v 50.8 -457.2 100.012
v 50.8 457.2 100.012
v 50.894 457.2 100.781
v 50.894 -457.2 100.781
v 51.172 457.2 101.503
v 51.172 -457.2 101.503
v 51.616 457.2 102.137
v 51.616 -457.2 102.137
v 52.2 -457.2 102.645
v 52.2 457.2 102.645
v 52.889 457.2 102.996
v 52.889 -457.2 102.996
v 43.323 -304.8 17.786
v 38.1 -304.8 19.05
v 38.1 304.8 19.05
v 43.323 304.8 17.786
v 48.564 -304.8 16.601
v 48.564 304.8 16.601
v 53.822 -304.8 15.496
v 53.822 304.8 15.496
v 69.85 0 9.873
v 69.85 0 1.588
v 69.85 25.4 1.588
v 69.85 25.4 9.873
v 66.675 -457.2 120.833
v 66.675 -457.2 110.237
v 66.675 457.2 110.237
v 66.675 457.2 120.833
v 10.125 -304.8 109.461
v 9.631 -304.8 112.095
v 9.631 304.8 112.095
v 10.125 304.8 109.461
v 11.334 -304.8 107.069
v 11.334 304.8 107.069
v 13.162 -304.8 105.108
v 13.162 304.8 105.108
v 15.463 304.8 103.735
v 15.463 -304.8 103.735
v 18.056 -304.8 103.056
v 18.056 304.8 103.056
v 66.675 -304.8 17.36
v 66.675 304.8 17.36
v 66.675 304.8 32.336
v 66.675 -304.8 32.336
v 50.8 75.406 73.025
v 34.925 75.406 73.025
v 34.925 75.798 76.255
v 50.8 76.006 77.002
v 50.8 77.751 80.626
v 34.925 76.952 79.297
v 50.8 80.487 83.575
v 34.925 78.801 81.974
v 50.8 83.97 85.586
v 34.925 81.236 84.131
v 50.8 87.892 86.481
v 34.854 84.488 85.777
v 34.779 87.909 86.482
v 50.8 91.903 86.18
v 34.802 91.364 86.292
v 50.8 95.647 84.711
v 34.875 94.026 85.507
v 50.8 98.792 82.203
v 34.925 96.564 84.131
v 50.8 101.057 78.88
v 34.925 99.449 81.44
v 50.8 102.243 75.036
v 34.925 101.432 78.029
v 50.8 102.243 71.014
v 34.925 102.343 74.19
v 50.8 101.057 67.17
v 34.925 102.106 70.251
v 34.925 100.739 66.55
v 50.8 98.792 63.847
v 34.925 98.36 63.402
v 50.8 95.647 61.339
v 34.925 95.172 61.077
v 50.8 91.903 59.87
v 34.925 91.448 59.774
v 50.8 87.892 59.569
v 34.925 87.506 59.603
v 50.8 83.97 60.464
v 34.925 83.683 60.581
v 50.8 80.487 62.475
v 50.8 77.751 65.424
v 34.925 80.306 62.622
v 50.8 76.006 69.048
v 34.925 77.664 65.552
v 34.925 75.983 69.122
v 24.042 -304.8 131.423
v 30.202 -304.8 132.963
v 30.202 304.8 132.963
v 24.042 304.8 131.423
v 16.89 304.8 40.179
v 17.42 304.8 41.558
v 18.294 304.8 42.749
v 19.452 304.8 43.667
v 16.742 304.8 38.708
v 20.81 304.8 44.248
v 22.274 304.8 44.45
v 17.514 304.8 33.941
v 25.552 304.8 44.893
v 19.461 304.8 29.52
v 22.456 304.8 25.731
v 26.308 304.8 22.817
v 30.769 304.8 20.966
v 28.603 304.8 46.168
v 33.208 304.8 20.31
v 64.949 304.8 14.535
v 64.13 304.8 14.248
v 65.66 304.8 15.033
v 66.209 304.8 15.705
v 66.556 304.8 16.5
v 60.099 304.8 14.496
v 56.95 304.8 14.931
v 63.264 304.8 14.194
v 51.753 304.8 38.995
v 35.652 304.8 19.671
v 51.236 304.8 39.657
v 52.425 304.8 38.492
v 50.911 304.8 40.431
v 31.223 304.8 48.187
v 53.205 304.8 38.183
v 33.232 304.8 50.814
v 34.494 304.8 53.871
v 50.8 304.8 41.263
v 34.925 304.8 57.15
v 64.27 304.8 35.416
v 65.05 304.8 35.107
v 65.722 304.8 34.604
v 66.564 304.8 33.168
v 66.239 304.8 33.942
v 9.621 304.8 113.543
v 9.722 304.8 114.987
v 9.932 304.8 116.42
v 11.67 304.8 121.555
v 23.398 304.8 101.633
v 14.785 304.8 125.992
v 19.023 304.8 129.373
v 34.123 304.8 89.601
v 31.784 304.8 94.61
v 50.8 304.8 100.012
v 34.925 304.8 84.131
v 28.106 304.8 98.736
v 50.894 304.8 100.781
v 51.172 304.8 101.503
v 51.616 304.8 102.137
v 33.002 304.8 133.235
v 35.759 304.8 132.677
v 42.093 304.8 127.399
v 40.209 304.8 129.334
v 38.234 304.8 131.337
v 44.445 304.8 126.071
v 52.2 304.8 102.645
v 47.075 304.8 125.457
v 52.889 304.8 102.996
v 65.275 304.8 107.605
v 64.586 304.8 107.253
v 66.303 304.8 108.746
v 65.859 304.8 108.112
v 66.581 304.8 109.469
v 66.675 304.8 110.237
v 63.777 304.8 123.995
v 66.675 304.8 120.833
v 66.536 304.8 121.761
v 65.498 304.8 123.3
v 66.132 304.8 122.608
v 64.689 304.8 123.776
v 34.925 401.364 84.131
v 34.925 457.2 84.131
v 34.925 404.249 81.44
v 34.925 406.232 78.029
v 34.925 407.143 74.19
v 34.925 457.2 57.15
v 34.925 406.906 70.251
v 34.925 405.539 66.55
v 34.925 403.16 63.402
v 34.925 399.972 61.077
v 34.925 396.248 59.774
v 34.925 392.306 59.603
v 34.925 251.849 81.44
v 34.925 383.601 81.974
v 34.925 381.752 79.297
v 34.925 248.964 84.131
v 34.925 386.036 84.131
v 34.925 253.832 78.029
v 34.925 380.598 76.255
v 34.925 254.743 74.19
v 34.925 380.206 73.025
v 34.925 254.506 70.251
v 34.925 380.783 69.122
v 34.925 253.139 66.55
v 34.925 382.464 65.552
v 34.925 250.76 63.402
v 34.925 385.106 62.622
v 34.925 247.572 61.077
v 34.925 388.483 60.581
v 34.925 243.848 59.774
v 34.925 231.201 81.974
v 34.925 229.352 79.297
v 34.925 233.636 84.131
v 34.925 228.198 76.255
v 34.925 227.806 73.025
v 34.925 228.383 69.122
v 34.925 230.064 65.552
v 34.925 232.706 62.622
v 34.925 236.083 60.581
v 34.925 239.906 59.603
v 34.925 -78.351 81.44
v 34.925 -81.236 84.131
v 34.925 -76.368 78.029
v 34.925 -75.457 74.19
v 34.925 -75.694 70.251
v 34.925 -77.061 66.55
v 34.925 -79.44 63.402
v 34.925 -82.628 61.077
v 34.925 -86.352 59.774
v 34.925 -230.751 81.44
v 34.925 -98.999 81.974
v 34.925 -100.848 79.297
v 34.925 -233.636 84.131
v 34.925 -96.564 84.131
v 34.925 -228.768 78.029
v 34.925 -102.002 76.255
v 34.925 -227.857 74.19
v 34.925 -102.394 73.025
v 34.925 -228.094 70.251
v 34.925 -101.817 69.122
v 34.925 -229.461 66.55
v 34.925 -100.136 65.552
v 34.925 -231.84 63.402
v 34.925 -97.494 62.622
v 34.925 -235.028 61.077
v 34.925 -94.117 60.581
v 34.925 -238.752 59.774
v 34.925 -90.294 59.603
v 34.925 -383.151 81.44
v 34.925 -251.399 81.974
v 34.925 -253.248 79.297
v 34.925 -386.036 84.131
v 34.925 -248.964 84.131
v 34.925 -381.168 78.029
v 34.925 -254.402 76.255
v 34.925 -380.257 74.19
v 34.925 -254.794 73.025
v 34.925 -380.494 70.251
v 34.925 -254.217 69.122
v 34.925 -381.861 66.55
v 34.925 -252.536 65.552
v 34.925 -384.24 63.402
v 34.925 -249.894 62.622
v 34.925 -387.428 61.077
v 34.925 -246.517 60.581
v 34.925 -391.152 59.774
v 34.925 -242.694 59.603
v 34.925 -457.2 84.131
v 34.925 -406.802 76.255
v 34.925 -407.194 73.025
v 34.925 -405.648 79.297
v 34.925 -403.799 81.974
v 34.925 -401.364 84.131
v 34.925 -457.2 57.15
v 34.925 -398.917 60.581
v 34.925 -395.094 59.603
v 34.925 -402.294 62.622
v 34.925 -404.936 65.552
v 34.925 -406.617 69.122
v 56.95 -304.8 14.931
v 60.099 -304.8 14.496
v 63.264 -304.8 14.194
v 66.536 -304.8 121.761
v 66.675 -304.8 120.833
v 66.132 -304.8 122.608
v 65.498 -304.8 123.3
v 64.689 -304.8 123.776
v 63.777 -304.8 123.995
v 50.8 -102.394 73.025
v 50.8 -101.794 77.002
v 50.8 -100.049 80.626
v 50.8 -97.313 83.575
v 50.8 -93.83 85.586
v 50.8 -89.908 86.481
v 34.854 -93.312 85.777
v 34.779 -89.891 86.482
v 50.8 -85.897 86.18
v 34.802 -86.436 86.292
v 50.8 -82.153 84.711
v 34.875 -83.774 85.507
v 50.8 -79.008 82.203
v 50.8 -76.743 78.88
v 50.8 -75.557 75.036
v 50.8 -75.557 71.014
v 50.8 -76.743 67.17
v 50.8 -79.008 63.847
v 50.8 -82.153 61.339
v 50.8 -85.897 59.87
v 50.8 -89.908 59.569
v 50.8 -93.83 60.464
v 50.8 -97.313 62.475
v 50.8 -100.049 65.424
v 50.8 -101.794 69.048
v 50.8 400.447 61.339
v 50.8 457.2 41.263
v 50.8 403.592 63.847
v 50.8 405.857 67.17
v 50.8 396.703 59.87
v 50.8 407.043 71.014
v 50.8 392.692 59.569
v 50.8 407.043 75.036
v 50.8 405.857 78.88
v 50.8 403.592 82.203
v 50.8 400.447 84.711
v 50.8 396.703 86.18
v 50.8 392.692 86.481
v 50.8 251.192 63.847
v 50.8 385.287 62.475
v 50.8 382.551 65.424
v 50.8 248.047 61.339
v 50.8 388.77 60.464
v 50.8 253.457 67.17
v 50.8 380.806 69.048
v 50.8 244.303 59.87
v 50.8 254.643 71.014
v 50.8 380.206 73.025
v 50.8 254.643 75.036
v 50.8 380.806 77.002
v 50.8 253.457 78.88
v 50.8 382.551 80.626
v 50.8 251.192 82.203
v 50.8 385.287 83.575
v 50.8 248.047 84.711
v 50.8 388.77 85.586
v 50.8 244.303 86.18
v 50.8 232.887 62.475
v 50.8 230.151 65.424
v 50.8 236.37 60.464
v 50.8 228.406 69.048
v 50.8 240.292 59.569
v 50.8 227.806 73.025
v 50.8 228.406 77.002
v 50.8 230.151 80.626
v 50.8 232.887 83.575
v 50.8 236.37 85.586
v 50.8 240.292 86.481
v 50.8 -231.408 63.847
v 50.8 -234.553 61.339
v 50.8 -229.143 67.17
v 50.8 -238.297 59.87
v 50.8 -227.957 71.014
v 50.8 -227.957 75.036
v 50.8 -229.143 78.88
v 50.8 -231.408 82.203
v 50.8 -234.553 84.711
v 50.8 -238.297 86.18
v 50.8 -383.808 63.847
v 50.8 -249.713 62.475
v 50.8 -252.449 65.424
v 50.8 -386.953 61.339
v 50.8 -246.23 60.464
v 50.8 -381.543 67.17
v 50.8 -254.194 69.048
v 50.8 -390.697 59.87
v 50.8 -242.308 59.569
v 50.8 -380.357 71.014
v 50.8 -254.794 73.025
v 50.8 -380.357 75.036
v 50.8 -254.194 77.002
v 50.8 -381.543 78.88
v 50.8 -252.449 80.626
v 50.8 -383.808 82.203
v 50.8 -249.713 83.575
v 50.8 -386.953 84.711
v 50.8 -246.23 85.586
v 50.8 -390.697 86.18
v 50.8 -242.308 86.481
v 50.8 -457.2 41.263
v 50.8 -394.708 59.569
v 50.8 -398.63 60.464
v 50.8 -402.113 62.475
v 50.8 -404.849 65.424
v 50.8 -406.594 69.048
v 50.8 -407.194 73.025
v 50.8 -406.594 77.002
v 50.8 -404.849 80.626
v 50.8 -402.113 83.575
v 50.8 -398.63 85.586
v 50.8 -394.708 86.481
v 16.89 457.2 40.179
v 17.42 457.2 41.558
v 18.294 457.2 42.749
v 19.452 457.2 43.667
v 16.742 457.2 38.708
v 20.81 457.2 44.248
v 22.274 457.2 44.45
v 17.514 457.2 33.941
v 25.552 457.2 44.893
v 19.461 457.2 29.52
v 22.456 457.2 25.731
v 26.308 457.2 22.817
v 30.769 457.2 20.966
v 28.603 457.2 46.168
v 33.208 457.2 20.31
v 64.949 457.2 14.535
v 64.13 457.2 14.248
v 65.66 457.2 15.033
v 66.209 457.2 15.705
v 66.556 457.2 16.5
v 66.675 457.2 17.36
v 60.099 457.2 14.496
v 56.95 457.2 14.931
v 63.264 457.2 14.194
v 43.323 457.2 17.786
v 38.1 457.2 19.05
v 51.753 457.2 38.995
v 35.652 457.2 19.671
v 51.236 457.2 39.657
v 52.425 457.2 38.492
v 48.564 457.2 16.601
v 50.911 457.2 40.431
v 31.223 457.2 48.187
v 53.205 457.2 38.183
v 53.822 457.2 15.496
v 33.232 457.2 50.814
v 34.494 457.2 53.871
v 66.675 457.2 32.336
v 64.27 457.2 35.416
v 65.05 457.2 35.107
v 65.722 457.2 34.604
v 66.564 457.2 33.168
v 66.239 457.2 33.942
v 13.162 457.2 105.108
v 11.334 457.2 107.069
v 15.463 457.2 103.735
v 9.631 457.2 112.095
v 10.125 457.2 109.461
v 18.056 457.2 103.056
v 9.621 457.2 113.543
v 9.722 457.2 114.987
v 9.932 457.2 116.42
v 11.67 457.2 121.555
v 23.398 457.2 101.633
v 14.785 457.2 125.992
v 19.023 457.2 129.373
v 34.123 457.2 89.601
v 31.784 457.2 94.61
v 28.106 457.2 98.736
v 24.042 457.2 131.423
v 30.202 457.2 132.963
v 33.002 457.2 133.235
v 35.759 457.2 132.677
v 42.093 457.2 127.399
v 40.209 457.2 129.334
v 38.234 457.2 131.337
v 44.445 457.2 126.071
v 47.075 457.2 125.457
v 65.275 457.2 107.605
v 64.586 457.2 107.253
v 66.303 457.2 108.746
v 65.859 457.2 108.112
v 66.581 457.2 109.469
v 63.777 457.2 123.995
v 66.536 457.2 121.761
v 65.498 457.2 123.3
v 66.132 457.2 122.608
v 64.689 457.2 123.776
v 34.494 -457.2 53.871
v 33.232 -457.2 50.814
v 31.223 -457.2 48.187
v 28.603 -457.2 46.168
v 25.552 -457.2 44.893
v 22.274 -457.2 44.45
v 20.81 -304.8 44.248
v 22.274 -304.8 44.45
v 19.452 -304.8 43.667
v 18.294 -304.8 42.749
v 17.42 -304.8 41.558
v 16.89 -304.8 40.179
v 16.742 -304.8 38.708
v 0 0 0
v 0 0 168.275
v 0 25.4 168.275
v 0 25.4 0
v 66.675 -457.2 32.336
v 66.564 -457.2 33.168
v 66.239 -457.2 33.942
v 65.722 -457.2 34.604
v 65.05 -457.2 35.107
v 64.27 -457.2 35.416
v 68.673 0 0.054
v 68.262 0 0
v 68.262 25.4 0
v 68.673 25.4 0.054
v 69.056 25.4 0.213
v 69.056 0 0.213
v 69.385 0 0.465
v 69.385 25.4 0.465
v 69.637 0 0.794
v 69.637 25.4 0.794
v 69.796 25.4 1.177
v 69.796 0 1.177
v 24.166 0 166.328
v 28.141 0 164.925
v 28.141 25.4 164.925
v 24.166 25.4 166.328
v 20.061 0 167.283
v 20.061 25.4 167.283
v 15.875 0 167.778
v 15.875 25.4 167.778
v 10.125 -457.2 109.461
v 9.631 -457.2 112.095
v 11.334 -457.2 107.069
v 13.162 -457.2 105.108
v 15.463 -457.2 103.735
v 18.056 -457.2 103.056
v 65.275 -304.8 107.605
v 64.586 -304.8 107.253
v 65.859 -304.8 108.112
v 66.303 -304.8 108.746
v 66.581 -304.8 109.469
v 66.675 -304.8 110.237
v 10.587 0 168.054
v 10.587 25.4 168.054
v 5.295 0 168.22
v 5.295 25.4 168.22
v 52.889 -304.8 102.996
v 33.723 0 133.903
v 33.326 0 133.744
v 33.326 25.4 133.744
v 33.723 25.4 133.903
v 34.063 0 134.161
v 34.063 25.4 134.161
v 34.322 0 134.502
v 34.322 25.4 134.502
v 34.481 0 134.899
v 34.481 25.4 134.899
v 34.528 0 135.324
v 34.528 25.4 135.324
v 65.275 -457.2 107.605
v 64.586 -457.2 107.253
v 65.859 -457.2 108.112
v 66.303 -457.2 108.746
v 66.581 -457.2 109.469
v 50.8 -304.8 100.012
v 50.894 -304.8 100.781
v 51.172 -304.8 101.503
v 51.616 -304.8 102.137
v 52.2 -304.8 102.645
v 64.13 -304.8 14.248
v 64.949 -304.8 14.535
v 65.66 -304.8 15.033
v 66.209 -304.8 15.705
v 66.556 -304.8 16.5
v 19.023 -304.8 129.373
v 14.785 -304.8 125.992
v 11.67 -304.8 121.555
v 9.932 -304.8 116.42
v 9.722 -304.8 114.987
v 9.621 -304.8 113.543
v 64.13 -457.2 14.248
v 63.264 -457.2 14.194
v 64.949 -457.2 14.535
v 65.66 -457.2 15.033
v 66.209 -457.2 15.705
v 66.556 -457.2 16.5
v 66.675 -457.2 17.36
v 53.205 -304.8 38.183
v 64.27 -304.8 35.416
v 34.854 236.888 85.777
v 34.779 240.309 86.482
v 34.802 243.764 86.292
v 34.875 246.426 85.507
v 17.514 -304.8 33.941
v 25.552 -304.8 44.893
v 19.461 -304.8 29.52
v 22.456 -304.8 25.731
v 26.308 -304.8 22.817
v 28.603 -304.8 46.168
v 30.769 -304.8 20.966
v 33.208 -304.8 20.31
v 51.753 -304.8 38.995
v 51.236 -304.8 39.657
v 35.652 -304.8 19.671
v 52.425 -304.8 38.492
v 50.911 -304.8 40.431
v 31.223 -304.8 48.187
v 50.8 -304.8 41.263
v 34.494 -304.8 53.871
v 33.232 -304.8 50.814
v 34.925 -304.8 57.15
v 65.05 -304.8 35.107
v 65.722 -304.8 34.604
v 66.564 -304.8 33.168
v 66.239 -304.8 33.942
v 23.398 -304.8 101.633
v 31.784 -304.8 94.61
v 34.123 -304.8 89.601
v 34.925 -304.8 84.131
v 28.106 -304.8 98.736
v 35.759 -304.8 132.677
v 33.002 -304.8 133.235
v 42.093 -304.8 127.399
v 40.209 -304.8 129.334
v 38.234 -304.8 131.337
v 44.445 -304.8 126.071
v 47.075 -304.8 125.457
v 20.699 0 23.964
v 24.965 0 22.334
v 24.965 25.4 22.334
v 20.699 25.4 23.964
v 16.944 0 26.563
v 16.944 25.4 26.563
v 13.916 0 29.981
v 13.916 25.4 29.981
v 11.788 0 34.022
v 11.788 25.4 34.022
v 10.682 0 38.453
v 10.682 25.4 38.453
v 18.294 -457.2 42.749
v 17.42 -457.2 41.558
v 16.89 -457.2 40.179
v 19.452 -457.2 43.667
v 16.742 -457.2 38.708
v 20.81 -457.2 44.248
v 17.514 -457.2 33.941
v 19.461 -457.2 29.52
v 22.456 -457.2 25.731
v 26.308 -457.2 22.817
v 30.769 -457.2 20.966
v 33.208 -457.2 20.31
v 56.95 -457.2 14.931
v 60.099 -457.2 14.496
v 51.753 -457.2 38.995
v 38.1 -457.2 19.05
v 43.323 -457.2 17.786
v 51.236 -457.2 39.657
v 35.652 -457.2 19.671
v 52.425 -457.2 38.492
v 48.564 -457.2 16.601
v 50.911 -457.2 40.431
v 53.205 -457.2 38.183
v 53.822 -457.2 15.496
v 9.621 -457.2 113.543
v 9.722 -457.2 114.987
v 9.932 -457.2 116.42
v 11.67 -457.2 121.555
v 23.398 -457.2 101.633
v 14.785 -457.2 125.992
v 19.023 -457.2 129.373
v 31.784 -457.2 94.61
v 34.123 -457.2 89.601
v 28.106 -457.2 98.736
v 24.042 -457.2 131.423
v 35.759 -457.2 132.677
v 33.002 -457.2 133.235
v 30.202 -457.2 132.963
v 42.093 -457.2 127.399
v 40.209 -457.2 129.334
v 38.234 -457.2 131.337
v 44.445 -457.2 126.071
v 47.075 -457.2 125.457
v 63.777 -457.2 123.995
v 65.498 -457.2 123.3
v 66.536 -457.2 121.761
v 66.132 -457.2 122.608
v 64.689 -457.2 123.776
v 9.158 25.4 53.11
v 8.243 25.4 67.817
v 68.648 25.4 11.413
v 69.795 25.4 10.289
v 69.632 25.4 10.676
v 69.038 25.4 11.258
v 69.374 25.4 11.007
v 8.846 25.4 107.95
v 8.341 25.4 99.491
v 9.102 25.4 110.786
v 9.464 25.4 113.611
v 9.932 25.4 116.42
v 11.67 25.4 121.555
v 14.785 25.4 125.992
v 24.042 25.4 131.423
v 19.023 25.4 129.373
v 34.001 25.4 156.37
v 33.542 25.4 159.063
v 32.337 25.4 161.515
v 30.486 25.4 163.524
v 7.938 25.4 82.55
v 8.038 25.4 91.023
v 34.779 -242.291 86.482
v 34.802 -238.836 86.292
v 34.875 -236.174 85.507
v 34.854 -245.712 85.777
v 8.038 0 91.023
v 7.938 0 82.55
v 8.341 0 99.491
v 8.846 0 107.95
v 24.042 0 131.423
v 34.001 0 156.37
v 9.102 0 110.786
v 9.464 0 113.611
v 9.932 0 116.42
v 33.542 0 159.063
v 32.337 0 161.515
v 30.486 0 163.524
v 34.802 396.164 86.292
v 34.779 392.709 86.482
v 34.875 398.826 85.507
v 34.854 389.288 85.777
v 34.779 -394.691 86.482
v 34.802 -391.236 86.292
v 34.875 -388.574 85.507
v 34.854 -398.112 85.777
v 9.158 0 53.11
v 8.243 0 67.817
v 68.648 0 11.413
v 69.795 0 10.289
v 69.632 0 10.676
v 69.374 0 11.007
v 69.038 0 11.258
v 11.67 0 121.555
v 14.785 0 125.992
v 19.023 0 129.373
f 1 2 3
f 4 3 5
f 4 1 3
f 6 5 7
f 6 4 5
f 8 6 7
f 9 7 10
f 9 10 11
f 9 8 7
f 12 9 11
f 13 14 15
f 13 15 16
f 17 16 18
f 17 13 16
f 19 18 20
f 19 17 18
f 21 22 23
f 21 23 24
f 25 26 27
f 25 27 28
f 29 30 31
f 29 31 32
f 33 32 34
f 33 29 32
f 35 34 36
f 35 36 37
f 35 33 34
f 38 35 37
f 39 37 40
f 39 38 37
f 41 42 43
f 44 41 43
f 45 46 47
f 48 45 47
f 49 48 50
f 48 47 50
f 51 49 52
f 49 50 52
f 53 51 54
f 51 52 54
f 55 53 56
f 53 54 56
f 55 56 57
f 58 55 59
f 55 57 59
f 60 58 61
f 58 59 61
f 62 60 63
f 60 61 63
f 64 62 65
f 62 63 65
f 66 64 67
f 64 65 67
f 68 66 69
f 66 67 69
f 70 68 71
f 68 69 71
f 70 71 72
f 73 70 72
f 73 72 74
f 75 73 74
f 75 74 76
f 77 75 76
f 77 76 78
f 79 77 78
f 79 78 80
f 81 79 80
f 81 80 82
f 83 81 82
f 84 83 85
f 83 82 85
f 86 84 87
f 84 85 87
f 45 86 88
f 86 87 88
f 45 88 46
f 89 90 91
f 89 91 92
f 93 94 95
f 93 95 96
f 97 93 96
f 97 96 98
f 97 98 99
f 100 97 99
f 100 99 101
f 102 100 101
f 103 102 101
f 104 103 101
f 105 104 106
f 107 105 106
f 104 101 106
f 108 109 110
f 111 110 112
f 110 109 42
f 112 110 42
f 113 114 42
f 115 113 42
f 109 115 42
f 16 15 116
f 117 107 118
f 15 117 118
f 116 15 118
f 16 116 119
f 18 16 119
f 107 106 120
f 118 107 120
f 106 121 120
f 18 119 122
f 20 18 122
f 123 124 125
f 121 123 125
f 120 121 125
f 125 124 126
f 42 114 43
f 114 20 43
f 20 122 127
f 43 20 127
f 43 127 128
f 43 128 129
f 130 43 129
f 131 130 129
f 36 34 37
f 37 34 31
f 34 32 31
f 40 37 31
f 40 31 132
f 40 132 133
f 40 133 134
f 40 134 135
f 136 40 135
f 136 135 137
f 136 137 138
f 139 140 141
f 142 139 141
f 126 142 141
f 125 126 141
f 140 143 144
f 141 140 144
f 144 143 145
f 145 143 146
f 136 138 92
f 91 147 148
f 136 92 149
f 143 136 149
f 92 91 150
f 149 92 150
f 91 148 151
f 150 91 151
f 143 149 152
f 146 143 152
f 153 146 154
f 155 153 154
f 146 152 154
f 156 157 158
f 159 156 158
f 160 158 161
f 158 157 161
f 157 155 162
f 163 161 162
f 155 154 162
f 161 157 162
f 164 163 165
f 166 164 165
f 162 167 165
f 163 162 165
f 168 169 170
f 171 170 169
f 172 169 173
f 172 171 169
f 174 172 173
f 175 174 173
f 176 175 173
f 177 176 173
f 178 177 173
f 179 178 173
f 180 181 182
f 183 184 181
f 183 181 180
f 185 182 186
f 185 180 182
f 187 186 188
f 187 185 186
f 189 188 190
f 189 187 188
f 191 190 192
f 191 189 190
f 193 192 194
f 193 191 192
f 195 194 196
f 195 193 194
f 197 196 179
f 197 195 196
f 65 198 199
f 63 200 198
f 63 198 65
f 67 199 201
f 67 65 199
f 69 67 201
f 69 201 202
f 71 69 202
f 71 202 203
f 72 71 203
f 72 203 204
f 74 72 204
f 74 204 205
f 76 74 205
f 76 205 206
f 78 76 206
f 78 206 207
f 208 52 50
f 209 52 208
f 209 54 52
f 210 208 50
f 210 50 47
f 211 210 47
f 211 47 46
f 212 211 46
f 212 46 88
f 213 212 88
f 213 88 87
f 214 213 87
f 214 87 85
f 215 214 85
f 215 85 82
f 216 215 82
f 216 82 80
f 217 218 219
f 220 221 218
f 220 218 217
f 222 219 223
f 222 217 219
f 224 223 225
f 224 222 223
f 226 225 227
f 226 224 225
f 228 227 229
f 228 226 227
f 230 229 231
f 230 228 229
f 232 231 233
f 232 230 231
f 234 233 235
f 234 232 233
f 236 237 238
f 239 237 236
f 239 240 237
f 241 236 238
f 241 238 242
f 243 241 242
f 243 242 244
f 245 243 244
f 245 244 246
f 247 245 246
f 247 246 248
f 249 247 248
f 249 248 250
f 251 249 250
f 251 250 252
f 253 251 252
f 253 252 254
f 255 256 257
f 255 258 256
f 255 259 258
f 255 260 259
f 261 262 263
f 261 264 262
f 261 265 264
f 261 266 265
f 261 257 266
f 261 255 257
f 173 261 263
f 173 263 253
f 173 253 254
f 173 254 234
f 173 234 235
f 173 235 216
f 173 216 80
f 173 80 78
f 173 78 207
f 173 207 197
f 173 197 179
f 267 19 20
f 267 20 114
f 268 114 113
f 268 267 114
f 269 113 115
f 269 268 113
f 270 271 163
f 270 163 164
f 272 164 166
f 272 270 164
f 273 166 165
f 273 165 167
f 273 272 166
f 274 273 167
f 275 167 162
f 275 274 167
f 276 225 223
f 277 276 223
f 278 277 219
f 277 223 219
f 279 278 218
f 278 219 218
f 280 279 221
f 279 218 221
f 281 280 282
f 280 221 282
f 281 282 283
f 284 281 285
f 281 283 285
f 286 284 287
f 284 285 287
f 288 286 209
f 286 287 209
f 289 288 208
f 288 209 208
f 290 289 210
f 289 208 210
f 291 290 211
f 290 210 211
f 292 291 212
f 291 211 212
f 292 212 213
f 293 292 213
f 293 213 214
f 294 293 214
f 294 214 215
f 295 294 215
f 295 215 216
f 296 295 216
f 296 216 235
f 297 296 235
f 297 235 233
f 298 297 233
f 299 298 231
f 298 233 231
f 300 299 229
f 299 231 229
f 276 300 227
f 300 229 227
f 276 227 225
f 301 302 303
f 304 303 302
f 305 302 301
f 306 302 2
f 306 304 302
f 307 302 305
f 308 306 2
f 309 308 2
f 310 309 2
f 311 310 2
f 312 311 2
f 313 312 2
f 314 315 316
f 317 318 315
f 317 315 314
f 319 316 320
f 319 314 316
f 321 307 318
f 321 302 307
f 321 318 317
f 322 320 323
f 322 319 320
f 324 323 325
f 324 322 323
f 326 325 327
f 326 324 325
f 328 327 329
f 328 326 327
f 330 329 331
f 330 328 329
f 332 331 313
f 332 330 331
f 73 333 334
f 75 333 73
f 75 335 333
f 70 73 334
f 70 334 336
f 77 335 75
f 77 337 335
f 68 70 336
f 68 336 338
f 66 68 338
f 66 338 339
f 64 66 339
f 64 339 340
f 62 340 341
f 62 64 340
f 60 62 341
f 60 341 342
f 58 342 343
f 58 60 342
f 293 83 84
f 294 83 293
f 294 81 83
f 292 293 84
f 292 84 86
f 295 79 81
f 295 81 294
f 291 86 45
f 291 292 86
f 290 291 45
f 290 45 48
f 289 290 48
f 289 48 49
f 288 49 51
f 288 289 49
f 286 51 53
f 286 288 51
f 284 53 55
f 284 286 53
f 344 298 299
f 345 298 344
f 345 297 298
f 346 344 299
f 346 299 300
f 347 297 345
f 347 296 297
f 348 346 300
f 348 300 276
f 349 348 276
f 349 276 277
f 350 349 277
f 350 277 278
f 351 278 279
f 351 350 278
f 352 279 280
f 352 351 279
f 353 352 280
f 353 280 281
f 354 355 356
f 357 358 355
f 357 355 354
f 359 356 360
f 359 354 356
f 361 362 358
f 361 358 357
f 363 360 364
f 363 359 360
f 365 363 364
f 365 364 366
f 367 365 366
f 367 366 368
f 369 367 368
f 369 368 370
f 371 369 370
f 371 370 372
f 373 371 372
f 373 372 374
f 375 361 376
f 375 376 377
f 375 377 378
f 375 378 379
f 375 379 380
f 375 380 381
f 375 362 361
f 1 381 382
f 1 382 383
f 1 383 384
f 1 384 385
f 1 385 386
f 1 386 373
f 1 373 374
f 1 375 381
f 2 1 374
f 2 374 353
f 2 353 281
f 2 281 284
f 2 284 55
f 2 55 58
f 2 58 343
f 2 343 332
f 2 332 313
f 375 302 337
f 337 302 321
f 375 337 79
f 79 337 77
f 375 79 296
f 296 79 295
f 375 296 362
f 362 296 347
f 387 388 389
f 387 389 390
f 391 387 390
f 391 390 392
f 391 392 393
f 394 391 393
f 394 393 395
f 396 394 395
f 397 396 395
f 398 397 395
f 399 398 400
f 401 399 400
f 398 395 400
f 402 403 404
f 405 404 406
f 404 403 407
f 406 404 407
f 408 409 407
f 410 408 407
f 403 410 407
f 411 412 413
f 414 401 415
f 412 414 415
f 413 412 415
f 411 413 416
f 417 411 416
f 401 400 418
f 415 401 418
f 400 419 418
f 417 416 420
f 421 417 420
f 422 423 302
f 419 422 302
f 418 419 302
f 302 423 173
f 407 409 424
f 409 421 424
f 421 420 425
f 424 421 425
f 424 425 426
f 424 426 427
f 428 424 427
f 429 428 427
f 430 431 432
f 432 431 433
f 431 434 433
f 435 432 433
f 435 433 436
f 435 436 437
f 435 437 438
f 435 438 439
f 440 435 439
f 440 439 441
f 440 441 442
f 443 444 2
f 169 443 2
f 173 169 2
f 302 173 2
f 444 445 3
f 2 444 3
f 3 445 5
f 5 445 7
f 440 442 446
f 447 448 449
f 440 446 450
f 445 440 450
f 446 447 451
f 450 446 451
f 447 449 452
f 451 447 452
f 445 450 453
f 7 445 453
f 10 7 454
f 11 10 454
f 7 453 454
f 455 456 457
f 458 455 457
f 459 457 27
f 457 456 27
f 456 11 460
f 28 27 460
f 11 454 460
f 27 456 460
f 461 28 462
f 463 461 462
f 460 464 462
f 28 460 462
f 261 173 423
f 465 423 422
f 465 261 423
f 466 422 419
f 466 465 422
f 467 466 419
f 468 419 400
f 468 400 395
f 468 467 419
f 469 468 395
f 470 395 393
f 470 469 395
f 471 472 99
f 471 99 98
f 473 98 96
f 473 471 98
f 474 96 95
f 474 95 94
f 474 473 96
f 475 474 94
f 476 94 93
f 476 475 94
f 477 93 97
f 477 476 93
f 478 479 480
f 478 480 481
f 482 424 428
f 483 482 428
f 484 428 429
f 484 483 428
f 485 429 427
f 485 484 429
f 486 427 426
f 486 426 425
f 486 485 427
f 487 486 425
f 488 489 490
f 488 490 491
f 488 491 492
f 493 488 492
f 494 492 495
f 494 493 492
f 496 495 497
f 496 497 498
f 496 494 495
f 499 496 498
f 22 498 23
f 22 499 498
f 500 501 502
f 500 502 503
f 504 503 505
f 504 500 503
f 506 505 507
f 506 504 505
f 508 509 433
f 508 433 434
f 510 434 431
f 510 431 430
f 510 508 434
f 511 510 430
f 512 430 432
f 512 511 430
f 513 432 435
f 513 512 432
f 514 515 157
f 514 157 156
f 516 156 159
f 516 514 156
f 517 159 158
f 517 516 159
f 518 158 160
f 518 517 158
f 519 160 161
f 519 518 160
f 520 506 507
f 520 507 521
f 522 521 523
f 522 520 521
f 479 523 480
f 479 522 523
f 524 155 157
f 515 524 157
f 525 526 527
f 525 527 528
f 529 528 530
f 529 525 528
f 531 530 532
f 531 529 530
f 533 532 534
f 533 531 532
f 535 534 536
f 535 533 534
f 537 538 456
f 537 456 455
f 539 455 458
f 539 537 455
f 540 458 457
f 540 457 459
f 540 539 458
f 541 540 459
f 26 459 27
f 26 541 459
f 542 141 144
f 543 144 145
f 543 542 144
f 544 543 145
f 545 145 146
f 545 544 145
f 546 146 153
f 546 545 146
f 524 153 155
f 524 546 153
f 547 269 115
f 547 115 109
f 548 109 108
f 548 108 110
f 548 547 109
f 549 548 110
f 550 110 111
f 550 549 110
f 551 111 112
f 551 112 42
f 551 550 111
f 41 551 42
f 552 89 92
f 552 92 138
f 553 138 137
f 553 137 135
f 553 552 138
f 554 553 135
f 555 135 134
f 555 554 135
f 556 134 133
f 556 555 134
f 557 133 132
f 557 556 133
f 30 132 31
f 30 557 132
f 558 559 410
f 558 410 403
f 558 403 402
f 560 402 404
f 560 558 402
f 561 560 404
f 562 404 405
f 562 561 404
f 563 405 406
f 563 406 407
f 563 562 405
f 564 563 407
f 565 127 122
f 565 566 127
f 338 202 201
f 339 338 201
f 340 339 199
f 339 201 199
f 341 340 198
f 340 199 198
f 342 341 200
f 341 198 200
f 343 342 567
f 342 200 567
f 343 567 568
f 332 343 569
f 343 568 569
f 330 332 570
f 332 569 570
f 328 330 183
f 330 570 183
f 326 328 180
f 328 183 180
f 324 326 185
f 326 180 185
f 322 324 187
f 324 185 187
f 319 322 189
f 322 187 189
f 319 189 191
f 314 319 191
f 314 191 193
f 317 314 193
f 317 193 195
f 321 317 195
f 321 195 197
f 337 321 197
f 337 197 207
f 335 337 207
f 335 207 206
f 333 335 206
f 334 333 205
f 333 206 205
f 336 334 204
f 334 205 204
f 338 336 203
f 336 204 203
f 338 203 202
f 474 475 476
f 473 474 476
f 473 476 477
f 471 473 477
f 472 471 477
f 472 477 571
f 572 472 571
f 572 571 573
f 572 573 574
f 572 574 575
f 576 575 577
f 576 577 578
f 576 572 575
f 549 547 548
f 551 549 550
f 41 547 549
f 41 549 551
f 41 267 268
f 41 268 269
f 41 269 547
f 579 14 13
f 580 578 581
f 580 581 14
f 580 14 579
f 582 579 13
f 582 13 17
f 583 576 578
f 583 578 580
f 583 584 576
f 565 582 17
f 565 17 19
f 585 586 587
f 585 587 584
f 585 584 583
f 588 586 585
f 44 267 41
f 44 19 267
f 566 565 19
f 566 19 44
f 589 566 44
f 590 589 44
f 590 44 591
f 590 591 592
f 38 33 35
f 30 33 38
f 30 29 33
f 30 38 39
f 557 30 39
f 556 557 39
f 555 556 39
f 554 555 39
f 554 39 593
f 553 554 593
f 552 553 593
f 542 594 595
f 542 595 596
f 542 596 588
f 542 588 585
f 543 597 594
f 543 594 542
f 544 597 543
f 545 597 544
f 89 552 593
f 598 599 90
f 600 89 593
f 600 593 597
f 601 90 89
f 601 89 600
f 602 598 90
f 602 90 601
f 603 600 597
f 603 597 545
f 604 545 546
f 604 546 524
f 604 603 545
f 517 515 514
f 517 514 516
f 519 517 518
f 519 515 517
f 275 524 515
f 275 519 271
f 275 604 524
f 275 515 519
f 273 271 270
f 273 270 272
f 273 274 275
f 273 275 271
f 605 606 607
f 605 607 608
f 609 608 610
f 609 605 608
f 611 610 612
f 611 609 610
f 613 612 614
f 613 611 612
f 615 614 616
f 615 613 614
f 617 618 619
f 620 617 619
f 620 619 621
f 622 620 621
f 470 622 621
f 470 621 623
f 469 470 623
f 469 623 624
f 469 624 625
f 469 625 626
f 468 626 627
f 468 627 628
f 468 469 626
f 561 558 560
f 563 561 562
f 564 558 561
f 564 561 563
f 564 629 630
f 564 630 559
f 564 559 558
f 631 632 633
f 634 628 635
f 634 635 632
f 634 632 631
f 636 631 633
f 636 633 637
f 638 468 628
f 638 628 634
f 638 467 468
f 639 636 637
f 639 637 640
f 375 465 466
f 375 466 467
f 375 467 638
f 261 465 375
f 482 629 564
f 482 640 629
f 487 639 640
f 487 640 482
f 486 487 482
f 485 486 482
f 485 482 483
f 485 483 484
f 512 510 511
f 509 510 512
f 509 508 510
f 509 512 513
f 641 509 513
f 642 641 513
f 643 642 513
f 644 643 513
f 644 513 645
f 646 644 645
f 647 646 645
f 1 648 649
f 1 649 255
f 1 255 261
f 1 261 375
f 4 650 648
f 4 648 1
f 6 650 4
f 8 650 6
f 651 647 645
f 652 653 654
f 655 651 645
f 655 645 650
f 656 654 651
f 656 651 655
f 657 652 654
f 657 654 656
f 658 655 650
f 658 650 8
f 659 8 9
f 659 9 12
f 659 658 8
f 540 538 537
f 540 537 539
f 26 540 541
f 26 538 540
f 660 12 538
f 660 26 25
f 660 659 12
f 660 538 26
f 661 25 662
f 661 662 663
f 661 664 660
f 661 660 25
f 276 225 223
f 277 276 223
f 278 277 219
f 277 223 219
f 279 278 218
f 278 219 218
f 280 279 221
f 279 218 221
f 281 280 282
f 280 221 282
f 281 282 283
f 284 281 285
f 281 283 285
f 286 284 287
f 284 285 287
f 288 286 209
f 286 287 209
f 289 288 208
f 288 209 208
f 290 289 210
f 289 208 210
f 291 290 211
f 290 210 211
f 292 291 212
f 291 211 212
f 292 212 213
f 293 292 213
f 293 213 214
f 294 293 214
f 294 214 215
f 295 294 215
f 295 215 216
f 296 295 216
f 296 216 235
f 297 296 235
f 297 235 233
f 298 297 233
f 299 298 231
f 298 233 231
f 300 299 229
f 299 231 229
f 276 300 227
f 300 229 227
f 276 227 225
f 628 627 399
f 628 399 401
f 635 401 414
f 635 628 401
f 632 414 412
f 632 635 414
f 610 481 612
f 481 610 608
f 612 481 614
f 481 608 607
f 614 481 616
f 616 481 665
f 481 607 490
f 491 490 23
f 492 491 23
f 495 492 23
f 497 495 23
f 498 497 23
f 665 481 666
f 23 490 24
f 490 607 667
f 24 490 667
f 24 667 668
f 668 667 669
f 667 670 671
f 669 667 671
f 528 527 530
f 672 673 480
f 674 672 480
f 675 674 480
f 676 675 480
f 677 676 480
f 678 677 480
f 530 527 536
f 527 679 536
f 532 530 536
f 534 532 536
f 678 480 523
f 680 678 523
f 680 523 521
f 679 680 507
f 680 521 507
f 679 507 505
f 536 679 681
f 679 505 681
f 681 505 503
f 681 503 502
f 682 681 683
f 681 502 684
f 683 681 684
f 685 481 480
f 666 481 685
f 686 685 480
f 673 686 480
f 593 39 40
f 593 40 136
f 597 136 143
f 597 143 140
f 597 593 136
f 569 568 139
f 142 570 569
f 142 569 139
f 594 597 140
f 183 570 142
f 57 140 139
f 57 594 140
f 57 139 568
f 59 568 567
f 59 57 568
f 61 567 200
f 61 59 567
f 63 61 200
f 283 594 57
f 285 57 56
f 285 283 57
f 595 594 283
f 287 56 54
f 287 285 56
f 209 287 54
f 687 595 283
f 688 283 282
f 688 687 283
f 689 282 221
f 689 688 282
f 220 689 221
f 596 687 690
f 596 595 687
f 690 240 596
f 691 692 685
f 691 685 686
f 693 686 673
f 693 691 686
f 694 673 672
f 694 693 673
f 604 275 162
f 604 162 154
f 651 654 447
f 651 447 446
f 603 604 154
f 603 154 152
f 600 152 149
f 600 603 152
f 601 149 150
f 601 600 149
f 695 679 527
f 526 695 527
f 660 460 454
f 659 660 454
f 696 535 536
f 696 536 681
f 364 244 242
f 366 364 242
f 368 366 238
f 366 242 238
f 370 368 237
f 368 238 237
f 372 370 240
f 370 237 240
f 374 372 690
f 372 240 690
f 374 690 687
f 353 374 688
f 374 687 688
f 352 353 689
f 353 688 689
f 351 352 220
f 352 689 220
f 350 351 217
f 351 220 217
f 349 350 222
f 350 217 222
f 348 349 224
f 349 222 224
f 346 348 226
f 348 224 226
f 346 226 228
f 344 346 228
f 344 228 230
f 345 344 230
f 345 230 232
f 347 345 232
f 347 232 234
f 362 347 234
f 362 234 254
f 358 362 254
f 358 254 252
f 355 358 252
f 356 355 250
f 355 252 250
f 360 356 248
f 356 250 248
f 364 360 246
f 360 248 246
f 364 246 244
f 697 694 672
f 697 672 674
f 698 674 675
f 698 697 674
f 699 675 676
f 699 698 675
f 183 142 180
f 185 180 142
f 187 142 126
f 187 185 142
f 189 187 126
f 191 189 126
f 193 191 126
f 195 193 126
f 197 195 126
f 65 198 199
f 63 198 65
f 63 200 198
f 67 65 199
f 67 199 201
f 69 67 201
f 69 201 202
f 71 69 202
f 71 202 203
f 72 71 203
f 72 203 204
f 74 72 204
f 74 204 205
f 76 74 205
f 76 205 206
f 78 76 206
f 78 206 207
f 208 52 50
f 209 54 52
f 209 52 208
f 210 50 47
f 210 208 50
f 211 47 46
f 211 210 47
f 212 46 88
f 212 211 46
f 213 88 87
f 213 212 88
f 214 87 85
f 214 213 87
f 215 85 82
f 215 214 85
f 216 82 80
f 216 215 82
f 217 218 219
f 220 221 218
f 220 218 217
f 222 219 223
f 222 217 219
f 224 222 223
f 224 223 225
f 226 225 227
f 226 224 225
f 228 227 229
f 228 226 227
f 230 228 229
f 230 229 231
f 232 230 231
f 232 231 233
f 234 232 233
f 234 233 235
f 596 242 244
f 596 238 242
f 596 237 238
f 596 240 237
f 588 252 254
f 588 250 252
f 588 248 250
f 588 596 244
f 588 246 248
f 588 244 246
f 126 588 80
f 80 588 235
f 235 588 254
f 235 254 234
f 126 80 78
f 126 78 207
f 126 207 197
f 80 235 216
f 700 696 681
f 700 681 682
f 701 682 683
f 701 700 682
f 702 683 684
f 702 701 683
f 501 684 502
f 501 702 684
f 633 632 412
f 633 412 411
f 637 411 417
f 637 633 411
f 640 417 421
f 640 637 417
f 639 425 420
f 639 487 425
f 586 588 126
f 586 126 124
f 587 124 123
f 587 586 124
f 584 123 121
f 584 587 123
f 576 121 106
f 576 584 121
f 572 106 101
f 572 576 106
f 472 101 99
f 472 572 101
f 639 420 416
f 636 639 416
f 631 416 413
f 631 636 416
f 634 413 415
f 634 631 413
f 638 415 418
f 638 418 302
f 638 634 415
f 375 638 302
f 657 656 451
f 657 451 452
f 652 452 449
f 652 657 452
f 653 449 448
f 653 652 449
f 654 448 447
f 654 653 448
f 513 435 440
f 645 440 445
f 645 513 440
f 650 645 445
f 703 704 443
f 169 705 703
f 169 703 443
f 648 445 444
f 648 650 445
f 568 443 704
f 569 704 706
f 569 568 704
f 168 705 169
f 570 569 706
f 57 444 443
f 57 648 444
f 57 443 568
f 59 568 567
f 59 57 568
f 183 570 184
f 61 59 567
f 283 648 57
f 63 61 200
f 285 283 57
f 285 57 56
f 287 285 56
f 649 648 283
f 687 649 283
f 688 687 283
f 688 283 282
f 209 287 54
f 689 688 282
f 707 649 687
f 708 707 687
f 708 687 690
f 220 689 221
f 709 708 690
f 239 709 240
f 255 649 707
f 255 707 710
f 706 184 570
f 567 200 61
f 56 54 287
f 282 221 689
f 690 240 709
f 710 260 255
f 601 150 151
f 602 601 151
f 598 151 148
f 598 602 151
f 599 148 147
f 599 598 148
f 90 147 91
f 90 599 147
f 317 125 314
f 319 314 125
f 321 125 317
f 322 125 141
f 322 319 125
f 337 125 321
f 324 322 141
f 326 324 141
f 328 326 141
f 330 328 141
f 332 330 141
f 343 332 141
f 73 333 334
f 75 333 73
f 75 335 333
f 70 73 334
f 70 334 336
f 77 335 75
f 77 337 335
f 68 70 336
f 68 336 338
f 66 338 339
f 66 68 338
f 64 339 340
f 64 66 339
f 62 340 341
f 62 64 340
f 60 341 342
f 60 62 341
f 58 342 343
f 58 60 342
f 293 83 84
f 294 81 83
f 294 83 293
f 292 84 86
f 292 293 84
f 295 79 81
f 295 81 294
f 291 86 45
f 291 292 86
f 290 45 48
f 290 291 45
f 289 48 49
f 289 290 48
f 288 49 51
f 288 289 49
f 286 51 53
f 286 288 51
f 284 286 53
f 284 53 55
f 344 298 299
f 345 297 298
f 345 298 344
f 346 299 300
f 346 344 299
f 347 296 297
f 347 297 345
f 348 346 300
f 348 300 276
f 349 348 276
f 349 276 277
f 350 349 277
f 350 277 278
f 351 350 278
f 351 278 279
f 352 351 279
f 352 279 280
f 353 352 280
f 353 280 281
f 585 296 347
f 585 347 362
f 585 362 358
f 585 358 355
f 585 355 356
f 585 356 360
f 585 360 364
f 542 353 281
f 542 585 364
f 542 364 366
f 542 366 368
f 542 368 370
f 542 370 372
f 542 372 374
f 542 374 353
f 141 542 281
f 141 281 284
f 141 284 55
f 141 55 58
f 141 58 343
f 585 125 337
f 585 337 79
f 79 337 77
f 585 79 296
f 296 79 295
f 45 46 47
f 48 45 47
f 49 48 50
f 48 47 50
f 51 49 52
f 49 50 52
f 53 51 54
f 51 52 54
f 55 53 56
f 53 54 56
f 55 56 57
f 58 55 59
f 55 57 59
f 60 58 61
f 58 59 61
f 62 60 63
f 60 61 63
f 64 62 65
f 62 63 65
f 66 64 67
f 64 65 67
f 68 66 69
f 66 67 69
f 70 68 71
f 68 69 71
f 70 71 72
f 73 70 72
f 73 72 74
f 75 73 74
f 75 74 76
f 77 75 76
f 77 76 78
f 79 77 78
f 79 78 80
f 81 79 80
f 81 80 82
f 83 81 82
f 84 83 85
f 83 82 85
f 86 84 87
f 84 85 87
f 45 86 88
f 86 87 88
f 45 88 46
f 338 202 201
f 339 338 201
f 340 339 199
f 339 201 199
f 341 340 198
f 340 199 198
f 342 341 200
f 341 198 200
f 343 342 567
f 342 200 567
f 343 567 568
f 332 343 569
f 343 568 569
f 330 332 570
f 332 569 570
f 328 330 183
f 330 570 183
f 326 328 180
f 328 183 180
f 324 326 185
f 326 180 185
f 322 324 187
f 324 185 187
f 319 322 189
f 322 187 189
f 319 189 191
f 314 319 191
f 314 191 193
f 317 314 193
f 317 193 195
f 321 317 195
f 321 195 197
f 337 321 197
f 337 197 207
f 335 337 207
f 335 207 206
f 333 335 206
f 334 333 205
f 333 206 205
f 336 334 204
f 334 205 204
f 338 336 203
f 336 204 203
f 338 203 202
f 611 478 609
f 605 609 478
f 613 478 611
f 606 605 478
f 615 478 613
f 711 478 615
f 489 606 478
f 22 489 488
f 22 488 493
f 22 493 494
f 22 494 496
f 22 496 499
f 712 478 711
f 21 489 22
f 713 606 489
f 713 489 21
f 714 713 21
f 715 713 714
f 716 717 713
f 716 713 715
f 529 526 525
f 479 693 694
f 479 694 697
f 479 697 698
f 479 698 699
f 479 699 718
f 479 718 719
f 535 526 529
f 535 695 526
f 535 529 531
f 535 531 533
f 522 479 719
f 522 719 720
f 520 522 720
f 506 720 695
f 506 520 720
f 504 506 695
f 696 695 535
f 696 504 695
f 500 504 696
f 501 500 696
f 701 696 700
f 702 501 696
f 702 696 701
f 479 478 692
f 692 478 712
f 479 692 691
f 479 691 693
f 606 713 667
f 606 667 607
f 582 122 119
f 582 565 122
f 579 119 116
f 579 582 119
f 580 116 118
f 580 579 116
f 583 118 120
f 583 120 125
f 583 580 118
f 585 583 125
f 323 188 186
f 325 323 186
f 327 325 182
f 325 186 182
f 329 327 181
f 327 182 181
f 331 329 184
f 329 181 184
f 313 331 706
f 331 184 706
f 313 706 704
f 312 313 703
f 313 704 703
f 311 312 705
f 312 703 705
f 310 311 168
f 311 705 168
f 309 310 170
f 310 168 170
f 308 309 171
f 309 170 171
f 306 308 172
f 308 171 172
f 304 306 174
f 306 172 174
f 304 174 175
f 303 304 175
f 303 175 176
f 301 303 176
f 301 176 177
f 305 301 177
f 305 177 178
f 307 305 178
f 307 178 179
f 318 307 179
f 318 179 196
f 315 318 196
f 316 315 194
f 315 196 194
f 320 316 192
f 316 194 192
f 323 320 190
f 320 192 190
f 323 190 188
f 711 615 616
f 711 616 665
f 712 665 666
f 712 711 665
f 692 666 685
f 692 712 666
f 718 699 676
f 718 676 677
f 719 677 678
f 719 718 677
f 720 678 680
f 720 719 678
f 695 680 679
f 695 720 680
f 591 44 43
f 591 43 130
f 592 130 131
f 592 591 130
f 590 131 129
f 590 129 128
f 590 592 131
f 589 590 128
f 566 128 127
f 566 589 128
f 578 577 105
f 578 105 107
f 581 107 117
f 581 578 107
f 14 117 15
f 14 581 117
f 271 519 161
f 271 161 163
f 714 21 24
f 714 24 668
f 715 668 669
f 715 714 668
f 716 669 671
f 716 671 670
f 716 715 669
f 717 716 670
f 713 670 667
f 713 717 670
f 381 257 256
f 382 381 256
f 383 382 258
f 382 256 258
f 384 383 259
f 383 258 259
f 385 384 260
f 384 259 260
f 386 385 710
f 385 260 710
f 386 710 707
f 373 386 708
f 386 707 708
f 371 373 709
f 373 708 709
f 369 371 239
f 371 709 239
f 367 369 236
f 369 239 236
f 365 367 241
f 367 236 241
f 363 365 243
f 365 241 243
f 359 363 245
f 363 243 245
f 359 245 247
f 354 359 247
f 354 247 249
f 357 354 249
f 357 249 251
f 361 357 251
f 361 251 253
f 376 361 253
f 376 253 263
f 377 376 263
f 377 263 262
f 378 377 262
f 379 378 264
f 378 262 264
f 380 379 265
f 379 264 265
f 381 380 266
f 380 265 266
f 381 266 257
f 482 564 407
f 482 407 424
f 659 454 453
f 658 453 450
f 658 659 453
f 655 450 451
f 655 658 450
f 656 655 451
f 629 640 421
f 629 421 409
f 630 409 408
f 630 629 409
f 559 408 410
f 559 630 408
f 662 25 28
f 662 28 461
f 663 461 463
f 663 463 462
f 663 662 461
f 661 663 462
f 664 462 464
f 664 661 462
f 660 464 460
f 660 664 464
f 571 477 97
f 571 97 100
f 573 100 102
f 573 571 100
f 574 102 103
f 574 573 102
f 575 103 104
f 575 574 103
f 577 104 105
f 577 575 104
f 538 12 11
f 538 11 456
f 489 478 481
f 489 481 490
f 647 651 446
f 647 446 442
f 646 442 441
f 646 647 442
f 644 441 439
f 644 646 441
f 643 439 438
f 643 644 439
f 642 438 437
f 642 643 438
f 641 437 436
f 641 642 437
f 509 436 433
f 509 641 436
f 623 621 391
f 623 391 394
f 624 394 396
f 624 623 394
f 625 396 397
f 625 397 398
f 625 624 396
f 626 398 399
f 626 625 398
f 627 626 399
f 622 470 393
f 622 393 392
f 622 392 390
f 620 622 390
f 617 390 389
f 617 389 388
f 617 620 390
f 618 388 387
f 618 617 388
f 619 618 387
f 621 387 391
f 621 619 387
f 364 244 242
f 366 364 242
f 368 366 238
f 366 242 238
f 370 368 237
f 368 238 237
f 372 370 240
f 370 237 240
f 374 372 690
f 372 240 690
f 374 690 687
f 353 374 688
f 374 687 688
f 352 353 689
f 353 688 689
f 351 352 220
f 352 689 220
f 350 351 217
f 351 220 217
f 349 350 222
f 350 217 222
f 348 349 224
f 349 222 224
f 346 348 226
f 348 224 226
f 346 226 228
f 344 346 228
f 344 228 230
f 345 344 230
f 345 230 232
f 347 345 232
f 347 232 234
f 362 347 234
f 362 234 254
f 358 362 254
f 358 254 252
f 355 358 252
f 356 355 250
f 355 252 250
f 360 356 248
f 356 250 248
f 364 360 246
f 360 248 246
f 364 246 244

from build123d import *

# Parameters (mm, degrees)
F1_DEPTH = 25.4
F5_DEPTH = 304.8
F6_D     = 26.9875
F7_DEPTH = 457.2
F8_D     = 26.9875


with BuildPart() as f1:
    # F0 (on Front) → F1 (new body)
    with BuildSketch(Plane.XZ):
        with BuildLine():
            Line((0, 168.275), (0, 0))
            Line((0, 0), (68.2625, 0))
            ThreePointArc((68.2625, 0), (69.3850320151, 0.4649679849), (69.85, 1.5875))
            Line((69.85, 1.5875), (69.85, 9.8730174548))
            ThreePointArc((69.85, 9.8730174548), (69.5137761329, 10.8499843373), (68.6475253047, 11.4131186738))
            Line((68.6475253047, 11.4131186738), (24.9649692751, 22.3337576812))
            ThreePointArc((24.9649692751, 22.3337576812), (15.3272819336, 28.1812003985), (10.6823166829, 38.452612251))
            ThreePointArc((10.6823166829, 38.452612251), (8.6243675383, 60.4586350302), (7.9375, 82.55))
            ThreePointArc((7.9375, 82.55), (8.1646482703, 95.2581176236), (8.8458028883, 107.95))
            ThreePointArc((8.8458028883, 107.95), (9.2701789256, 112.2001459495), (9.9320304407, 116.4198364814))
            ThreePointArc((9.9320304407, 116.4198364814), (14.7845142922, 125.9924500169), (24.0415108124, 131.4228777031))
            Line((24.0415108124, 131.4228777031), (33.3256503047, 133.7439125762))
            ThreePointArc((33.3256503047, 133.7439125762), (34.2040230216, 134.3227741326), (34.5276282816, 135.3237231657))
            Line((34.5276282816, 135.3237231657), (34.0010108957, 156.3702295088))
            ThreePointArc((34.0010108957, 156.3702295088), (32.3370399621, 161.5149738191), (28.1407382747, 164.9249951439))
            ThreePointArc((28.1407382747, 164.9249951439), (22.1265788659, 166.8619937368), (15.875, 167.7784208349))
            ThreePointArc((15.875, 167.7784208349), (7.9413823713, 168.1508248554), (0, 168.275))
        make_face()
    extrude(amount=-F1_DEPTH)


with BuildPart() as f5:
    # F2 (on Front) → F5 (new body, symmetric)
    with BuildSketch(Plane.XZ):
        with BuildLine():
            Line((50.8, 41.2629707227), (50.8, 100.0125))
            ThreePointArc((50.8, 100.0125), (51.3741922594, 101.8336051854), (52.8890860449, 102.996024071))
            Line((52.8890860449, 102.996024071), (64.5859139551, 107.2533212656))
            ThreePointArc((64.5859139551, 107.2533212656), (66.1008077406, 108.4157401512), (66.675, 110.2368453366))
            Line((66.675, 110.2368453366), (66.675, 120.8325639578))
            ThreePointArc((66.675, 120.8325639578), (65.8408555444, 122.9775628669), (63.7767194832, 123.9954821242))
            Line((63.7767194832, 123.9954821242), (47.0749241448, 125.4566998768))
            ThreePointArc((47.0749241448, 125.4566998768), (43.221686006, 126.6513949723), (40.2085750556, 129.3339129922))
            ThreePointArc((40.2085750556, 129.3339129922), (35.7594875451, 132.6766939253), (30.2019156883, 132.9629789221))
            Line((30.2019156883, 132.9629789221), (24.0415108124, 131.4228777031))
            ThreePointArc((24.0415108124, 131.4228777031), (14.7845142922, 125.9924500169), (9.9320304407, 116.4198364814))
            ThreePointArc((9.9320304407, 116.4198364814), (9.6579163907, 114.2661848069), (9.6306237319, 112.0953303303))
            ThreePointArc((9.6306237319, 112.0953303303), (12.1785319064, 106.0241175821), (18.0558127337, 103.0561165078))
            ThreePointArc((18.0558127337, 103.0561165078), (30.0955306261, 96.8072785186), (34.925, 84.1313561178))
            Line((34.925, 84.1313561178), (34.925, 57.15))
            ThreePointArc((34.925, 57.15), (31.2226029793, 48.1871243104), (22.2741117123, 44.4500949594))
            ThreePointArc((22.2741117123, 44.4500949594), (18.2941990707, 42.7488469424), (16.7424483739, 38.7083000457))
            ThreePointArc((16.7424483739, 38.7083000457), (20.8376968822, 27.5303796318), (30.7687707347, 20.9660261024))
            ThreePointArc((30.7687707347, 20.9660261024), (34.4292808671, 19.9884850791), (38.0999984233, 19.0500003942))
            ThreePointArc((38.0999984233, 19.0500003942), (45.941035202, 17.1838969048), (53.8223522455, 15.4959864634))
            ThreePointArc((53.8223522455, 15.4959864634), (58.5226548629, 14.6970984785), (63.2637177656, 14.1937206277))
            ThreePointArc((63.2637177656, 14.1937206277), (65.6599107511, 15.0328129387), (66.675, 17.3599164059))
            Line((66.675, 17.3599164059), (66.675, 32.336290542))
            ThreePointArc((66.675, 32.336290542), (66.0025522657, 34.2902243069), (64.2700506095, 35.41649298))
            Line((64.2700506095, 35.41649298), (53.2049493905, 38.1827682847))
            ThreePointArc((53.2049493905, 38.1827682847), (51.4724477343, 39.3090369578), (50.8, 41.2629707227))
        make_face()
    extrude(amount=F5_DEPTH, both=True)

    # F6 (through all)
    with Locations(Plane.YZ.offset(76.2)):
        with Locations((-241.3, 73.025), (-88.9, 73.025), (88.9, 73.025), (241.3, 73.025)):
            Hole(F6_D / 2)


with BuildPart() as f7:
    # F2 (on Front) → F7 (new body, symmetric)
    with BuildSketch(Plane.XZ):
        with BuildLine():
            Line((50.8, 41.2629707227), (50.8, 100.0125))
            ThreePointArc((50.8, 100.0125), (51.3741922594, 101.8336051854), (52.8890860449, 102.996024071))
            Line((52.8890860449, 102.996024071), (64.5859139551, 107.2533212656))
            ThreePointArc((64.5859139551, 107.2533212656), (66.1008077406, 108.4157401512), (66.675, 110.2368453366))
            Line((66.675, 110.2368453366), (66.675, 120.8325639578))
            ThreePointArc((66.675, 120.8325639578), (65.8408555444, 122.9775628669), (63.7767194832, 123.9954821242))
            Line((63.7767194832, 123.9954821242), (47.0749241448, 125.4566998768))
            ThreePointArc((47.0749241448, 125.4566998768), (43.221686006, 126.6513949723), (40.2085750556, 129.3339129922))
            ThreePointArc((40.2085750556, 129.3339129922), (35.7594875451, 132.6766939253), (30.2019156883, 132.9629789221))
            Line((30.2019156883, 132.9629789221), (24.0415108124, 131.4228777031))
            ThreePointArc((24.0415108124, 131.4228777031), (14.7845142922, 125.9924500169), (9.9320304407, 116.4198364814))
            ThreePointArc((9.9320304407, 116.4198364814), (9.6579163907, 114.2661848069), (9.6306237319, 112.0953303303))
            ThreePointArc((9.6306237319, 112.0953303303), (12.1785319064, 106.0241175821), (18.0558127337, 103.0561165078))
            ThreePointArc((18.0558127337, 103.0561165078), (30.0955306261, 96.8072785186), (34.925, 84.1313561178))
            Line((34.925, 84.1313561178), (34.925, 57.15))
            ThreePointArc((34.925, 57.15), (31.2226029793, 48.1871243104), (22.2741117123, 44.4500949594))
            ThreePointArc((22.2741117123, 44.4500949594), (18.2941990707, 42.7488469424), (16.7424483739, 38.7083000457))
            ThreePointArc((16.7424483739, 38.7083000457), (20.8376968822, 27.5303796318), (30.7687707347, 20.9660261024))
            ThreePointArc((30.7687707347, 20.9660261024), (34.4292808671, 19.9884850791), (38.0999984233, 19.0500003942))
            ThreePointArc((38.0999984233, 19.0500003942), (45.941035202, 17.1838969048), (53.8223522455, 15.4959864634))
            ThreePointArc((53.8223522455, 15.4959864634), (58.5226548629, 14.6970984785), (63.2637177656, 14.1937206277))
            ThreePointArc((63.2637177656, 14.1937206277), (65.6599107511, 15.0328129387), (66.675, 17.3599164059))
            Line((66.675, 17.3599164059), (66.675, 32.336290542))
            ThreePointArc((66.675, 32.336290542), (66.0025522657, 34.2902243069), (64.2700506095, 35.41649298))
            Line((64.2700506095, 35.41649298), (53.2049493905, 38.1827682847))
            ThreePointArc((53.2049493905, 38.1827682847), (51.4724477343, 39.3090369578), (50.8, 41.2629707227))
        make_face()
    extrude(amount=F7_DEPTH, both=True)

    # F8 (through all)
    with Locations(Plane.YZ.offset(76.2)):
        with Locations((-393.7, 73.025), (-241.3, 73.025), (-88.9, 73.025), (88.9, 73.025), (241.3, 73.025), (393.7, 73.025)):
            Hole(F8_D / 2)


solid = Compound([f1.part, f5.part, f7.part])
